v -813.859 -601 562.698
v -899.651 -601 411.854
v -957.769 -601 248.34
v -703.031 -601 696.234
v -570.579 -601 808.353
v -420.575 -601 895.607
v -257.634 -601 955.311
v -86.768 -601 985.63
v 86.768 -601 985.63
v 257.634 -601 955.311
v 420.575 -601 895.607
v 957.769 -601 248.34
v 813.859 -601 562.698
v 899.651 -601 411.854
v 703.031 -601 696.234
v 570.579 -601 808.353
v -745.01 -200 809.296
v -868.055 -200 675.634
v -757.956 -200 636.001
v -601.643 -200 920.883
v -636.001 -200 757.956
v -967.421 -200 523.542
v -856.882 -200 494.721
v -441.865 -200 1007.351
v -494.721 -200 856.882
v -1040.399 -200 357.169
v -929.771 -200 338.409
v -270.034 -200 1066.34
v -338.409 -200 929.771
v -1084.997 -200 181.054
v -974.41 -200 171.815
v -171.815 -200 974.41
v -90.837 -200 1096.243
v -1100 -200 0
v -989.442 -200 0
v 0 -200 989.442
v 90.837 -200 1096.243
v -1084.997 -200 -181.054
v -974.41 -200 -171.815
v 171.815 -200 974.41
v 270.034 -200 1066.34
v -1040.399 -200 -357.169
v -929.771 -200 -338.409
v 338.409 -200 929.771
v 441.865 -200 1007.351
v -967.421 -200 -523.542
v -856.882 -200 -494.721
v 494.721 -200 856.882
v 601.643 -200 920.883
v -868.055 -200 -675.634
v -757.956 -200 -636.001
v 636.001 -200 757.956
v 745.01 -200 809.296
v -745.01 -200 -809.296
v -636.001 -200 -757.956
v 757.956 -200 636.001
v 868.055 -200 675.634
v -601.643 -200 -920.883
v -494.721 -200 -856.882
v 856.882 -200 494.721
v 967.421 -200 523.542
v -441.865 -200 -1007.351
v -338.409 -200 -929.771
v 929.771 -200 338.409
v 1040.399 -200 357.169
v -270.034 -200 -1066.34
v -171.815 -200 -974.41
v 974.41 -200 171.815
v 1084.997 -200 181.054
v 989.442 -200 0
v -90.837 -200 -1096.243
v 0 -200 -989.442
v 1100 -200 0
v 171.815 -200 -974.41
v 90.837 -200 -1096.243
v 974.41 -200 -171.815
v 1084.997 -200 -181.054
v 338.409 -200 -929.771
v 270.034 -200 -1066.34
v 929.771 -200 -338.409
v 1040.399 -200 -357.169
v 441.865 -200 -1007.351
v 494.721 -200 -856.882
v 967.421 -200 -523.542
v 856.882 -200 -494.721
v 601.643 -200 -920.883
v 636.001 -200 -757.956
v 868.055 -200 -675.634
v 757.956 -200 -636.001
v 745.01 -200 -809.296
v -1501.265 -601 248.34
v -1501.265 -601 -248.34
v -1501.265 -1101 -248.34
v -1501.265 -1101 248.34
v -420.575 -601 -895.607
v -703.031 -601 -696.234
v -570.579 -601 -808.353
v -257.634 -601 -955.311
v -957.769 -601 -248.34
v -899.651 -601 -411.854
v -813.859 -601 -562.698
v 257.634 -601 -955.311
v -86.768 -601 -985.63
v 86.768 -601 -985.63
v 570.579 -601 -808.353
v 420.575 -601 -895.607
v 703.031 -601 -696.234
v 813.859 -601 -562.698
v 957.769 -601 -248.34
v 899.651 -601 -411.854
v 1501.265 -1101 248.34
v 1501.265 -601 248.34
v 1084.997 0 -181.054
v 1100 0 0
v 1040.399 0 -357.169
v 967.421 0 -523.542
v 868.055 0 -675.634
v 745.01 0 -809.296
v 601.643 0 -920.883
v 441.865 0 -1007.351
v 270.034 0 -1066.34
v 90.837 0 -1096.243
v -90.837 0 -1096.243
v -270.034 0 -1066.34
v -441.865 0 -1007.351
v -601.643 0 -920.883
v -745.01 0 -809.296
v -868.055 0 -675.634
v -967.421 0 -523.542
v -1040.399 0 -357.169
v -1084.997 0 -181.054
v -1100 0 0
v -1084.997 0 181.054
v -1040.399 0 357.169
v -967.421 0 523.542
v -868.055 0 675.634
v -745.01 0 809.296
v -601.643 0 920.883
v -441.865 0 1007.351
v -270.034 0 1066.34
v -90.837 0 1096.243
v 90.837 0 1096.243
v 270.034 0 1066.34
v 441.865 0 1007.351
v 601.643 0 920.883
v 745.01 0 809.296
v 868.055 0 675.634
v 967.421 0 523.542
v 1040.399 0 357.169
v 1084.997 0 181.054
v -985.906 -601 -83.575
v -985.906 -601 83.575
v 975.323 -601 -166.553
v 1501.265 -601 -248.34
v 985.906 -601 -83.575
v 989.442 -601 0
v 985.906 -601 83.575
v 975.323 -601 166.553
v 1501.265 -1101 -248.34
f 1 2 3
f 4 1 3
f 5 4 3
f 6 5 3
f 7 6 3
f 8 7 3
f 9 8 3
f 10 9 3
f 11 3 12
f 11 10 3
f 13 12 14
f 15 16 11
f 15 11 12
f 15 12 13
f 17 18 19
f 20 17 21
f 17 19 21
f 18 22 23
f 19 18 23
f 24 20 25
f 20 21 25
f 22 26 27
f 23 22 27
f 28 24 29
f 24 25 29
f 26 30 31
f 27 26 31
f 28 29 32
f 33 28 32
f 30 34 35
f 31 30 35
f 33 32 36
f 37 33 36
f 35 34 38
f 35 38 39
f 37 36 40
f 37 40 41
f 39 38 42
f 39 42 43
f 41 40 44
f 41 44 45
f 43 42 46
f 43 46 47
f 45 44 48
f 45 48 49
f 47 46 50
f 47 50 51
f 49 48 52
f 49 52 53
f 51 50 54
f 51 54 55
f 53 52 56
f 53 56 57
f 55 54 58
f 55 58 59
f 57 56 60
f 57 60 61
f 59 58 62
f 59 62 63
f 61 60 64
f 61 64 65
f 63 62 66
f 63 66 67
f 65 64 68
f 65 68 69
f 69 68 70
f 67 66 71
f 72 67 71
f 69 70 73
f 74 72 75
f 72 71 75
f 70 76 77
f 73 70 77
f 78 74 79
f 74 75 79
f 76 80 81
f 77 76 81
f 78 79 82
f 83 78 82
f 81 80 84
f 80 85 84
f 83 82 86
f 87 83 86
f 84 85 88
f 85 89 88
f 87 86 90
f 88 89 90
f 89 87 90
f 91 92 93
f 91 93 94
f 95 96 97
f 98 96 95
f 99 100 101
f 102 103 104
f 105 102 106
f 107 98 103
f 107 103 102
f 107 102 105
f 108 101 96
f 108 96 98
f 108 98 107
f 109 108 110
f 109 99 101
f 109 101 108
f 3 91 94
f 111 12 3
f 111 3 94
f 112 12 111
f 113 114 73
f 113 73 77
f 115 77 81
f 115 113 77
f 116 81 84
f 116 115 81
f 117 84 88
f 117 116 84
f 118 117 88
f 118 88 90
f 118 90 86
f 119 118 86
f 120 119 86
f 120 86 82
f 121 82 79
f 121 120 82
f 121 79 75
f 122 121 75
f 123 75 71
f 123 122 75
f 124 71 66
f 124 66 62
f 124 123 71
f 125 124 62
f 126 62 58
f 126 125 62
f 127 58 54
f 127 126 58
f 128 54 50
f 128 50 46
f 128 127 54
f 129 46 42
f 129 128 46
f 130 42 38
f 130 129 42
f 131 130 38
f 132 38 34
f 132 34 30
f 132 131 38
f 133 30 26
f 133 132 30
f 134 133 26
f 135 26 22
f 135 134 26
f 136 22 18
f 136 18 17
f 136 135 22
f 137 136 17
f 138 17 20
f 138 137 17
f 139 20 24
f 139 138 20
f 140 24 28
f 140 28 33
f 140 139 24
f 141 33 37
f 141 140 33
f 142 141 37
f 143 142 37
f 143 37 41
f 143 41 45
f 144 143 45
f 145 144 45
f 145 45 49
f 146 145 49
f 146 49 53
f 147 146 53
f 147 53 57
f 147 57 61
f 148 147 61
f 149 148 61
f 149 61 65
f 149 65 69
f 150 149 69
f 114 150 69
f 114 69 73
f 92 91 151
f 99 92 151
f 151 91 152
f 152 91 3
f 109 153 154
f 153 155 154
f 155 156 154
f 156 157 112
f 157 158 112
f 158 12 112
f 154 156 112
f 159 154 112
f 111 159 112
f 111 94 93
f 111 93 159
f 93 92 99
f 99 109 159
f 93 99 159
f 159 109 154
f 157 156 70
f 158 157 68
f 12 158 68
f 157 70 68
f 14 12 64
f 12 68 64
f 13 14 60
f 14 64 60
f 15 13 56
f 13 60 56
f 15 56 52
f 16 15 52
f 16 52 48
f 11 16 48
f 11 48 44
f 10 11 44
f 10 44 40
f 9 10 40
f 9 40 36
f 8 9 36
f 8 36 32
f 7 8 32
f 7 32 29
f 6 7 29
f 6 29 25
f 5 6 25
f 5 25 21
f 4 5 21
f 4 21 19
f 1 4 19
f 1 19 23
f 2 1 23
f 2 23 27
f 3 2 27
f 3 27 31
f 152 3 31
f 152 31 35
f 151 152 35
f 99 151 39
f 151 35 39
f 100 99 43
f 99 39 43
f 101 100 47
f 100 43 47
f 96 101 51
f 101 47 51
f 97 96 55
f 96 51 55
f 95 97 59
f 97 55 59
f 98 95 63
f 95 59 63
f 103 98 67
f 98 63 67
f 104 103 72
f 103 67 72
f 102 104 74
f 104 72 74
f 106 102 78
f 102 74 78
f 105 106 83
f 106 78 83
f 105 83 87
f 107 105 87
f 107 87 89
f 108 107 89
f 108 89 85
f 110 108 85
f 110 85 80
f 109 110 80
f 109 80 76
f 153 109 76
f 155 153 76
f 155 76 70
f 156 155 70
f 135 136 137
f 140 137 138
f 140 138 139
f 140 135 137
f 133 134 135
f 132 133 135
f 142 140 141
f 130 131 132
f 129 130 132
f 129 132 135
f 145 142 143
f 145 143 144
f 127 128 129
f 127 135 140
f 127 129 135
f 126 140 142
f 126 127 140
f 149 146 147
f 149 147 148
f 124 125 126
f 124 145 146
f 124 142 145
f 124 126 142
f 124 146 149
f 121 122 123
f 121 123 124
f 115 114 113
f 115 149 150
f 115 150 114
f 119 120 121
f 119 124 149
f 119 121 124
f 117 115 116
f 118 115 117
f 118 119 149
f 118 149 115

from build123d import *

# Parameters (mm, degrees)
SKETCH2_R           = 1100
BOSS_EXTRUDE1_DEPTH = 200
SKETCH3_R           = 989.441781837
BOSS_EXTRUDE2_DEPTH = 401
SKETCH4_W           = 3002.53007642
SKETCH4_H           = 496.680208904
BOSS_EXTRUDE3_DEPTH = 500


with BuildPart() as part:
    # Sketch2 → Boss-Extrude1 (new body)
    with BuildSketch(Plane(origin=(0, 0, 0), x_dir=(1, 0, 0), z_dir=(0, 1, 0))):
        Circle(SKETCH2_R)
    extrude(amount=-BOSS_EXTRUDE1_DEPTH)

    # Sketch3 → Boss-Extrude2 (add)
    with BuildSketch(Plane.XZ.offset(200)):
        Circle(SKETCH3_R)
    extrude(amount=BOSS_EXTRUDE2_DEPTH)

    # Sketch4 → Boss-Extrude3 (add)
    with BuildSketch(Plane.XZ.offset(601)):
        Rectangle(SKETCH4_W, SKETCH4_H)
    extrude(amount=BOSS_EXTRUDE3_DEPTH)


solid = part.part
